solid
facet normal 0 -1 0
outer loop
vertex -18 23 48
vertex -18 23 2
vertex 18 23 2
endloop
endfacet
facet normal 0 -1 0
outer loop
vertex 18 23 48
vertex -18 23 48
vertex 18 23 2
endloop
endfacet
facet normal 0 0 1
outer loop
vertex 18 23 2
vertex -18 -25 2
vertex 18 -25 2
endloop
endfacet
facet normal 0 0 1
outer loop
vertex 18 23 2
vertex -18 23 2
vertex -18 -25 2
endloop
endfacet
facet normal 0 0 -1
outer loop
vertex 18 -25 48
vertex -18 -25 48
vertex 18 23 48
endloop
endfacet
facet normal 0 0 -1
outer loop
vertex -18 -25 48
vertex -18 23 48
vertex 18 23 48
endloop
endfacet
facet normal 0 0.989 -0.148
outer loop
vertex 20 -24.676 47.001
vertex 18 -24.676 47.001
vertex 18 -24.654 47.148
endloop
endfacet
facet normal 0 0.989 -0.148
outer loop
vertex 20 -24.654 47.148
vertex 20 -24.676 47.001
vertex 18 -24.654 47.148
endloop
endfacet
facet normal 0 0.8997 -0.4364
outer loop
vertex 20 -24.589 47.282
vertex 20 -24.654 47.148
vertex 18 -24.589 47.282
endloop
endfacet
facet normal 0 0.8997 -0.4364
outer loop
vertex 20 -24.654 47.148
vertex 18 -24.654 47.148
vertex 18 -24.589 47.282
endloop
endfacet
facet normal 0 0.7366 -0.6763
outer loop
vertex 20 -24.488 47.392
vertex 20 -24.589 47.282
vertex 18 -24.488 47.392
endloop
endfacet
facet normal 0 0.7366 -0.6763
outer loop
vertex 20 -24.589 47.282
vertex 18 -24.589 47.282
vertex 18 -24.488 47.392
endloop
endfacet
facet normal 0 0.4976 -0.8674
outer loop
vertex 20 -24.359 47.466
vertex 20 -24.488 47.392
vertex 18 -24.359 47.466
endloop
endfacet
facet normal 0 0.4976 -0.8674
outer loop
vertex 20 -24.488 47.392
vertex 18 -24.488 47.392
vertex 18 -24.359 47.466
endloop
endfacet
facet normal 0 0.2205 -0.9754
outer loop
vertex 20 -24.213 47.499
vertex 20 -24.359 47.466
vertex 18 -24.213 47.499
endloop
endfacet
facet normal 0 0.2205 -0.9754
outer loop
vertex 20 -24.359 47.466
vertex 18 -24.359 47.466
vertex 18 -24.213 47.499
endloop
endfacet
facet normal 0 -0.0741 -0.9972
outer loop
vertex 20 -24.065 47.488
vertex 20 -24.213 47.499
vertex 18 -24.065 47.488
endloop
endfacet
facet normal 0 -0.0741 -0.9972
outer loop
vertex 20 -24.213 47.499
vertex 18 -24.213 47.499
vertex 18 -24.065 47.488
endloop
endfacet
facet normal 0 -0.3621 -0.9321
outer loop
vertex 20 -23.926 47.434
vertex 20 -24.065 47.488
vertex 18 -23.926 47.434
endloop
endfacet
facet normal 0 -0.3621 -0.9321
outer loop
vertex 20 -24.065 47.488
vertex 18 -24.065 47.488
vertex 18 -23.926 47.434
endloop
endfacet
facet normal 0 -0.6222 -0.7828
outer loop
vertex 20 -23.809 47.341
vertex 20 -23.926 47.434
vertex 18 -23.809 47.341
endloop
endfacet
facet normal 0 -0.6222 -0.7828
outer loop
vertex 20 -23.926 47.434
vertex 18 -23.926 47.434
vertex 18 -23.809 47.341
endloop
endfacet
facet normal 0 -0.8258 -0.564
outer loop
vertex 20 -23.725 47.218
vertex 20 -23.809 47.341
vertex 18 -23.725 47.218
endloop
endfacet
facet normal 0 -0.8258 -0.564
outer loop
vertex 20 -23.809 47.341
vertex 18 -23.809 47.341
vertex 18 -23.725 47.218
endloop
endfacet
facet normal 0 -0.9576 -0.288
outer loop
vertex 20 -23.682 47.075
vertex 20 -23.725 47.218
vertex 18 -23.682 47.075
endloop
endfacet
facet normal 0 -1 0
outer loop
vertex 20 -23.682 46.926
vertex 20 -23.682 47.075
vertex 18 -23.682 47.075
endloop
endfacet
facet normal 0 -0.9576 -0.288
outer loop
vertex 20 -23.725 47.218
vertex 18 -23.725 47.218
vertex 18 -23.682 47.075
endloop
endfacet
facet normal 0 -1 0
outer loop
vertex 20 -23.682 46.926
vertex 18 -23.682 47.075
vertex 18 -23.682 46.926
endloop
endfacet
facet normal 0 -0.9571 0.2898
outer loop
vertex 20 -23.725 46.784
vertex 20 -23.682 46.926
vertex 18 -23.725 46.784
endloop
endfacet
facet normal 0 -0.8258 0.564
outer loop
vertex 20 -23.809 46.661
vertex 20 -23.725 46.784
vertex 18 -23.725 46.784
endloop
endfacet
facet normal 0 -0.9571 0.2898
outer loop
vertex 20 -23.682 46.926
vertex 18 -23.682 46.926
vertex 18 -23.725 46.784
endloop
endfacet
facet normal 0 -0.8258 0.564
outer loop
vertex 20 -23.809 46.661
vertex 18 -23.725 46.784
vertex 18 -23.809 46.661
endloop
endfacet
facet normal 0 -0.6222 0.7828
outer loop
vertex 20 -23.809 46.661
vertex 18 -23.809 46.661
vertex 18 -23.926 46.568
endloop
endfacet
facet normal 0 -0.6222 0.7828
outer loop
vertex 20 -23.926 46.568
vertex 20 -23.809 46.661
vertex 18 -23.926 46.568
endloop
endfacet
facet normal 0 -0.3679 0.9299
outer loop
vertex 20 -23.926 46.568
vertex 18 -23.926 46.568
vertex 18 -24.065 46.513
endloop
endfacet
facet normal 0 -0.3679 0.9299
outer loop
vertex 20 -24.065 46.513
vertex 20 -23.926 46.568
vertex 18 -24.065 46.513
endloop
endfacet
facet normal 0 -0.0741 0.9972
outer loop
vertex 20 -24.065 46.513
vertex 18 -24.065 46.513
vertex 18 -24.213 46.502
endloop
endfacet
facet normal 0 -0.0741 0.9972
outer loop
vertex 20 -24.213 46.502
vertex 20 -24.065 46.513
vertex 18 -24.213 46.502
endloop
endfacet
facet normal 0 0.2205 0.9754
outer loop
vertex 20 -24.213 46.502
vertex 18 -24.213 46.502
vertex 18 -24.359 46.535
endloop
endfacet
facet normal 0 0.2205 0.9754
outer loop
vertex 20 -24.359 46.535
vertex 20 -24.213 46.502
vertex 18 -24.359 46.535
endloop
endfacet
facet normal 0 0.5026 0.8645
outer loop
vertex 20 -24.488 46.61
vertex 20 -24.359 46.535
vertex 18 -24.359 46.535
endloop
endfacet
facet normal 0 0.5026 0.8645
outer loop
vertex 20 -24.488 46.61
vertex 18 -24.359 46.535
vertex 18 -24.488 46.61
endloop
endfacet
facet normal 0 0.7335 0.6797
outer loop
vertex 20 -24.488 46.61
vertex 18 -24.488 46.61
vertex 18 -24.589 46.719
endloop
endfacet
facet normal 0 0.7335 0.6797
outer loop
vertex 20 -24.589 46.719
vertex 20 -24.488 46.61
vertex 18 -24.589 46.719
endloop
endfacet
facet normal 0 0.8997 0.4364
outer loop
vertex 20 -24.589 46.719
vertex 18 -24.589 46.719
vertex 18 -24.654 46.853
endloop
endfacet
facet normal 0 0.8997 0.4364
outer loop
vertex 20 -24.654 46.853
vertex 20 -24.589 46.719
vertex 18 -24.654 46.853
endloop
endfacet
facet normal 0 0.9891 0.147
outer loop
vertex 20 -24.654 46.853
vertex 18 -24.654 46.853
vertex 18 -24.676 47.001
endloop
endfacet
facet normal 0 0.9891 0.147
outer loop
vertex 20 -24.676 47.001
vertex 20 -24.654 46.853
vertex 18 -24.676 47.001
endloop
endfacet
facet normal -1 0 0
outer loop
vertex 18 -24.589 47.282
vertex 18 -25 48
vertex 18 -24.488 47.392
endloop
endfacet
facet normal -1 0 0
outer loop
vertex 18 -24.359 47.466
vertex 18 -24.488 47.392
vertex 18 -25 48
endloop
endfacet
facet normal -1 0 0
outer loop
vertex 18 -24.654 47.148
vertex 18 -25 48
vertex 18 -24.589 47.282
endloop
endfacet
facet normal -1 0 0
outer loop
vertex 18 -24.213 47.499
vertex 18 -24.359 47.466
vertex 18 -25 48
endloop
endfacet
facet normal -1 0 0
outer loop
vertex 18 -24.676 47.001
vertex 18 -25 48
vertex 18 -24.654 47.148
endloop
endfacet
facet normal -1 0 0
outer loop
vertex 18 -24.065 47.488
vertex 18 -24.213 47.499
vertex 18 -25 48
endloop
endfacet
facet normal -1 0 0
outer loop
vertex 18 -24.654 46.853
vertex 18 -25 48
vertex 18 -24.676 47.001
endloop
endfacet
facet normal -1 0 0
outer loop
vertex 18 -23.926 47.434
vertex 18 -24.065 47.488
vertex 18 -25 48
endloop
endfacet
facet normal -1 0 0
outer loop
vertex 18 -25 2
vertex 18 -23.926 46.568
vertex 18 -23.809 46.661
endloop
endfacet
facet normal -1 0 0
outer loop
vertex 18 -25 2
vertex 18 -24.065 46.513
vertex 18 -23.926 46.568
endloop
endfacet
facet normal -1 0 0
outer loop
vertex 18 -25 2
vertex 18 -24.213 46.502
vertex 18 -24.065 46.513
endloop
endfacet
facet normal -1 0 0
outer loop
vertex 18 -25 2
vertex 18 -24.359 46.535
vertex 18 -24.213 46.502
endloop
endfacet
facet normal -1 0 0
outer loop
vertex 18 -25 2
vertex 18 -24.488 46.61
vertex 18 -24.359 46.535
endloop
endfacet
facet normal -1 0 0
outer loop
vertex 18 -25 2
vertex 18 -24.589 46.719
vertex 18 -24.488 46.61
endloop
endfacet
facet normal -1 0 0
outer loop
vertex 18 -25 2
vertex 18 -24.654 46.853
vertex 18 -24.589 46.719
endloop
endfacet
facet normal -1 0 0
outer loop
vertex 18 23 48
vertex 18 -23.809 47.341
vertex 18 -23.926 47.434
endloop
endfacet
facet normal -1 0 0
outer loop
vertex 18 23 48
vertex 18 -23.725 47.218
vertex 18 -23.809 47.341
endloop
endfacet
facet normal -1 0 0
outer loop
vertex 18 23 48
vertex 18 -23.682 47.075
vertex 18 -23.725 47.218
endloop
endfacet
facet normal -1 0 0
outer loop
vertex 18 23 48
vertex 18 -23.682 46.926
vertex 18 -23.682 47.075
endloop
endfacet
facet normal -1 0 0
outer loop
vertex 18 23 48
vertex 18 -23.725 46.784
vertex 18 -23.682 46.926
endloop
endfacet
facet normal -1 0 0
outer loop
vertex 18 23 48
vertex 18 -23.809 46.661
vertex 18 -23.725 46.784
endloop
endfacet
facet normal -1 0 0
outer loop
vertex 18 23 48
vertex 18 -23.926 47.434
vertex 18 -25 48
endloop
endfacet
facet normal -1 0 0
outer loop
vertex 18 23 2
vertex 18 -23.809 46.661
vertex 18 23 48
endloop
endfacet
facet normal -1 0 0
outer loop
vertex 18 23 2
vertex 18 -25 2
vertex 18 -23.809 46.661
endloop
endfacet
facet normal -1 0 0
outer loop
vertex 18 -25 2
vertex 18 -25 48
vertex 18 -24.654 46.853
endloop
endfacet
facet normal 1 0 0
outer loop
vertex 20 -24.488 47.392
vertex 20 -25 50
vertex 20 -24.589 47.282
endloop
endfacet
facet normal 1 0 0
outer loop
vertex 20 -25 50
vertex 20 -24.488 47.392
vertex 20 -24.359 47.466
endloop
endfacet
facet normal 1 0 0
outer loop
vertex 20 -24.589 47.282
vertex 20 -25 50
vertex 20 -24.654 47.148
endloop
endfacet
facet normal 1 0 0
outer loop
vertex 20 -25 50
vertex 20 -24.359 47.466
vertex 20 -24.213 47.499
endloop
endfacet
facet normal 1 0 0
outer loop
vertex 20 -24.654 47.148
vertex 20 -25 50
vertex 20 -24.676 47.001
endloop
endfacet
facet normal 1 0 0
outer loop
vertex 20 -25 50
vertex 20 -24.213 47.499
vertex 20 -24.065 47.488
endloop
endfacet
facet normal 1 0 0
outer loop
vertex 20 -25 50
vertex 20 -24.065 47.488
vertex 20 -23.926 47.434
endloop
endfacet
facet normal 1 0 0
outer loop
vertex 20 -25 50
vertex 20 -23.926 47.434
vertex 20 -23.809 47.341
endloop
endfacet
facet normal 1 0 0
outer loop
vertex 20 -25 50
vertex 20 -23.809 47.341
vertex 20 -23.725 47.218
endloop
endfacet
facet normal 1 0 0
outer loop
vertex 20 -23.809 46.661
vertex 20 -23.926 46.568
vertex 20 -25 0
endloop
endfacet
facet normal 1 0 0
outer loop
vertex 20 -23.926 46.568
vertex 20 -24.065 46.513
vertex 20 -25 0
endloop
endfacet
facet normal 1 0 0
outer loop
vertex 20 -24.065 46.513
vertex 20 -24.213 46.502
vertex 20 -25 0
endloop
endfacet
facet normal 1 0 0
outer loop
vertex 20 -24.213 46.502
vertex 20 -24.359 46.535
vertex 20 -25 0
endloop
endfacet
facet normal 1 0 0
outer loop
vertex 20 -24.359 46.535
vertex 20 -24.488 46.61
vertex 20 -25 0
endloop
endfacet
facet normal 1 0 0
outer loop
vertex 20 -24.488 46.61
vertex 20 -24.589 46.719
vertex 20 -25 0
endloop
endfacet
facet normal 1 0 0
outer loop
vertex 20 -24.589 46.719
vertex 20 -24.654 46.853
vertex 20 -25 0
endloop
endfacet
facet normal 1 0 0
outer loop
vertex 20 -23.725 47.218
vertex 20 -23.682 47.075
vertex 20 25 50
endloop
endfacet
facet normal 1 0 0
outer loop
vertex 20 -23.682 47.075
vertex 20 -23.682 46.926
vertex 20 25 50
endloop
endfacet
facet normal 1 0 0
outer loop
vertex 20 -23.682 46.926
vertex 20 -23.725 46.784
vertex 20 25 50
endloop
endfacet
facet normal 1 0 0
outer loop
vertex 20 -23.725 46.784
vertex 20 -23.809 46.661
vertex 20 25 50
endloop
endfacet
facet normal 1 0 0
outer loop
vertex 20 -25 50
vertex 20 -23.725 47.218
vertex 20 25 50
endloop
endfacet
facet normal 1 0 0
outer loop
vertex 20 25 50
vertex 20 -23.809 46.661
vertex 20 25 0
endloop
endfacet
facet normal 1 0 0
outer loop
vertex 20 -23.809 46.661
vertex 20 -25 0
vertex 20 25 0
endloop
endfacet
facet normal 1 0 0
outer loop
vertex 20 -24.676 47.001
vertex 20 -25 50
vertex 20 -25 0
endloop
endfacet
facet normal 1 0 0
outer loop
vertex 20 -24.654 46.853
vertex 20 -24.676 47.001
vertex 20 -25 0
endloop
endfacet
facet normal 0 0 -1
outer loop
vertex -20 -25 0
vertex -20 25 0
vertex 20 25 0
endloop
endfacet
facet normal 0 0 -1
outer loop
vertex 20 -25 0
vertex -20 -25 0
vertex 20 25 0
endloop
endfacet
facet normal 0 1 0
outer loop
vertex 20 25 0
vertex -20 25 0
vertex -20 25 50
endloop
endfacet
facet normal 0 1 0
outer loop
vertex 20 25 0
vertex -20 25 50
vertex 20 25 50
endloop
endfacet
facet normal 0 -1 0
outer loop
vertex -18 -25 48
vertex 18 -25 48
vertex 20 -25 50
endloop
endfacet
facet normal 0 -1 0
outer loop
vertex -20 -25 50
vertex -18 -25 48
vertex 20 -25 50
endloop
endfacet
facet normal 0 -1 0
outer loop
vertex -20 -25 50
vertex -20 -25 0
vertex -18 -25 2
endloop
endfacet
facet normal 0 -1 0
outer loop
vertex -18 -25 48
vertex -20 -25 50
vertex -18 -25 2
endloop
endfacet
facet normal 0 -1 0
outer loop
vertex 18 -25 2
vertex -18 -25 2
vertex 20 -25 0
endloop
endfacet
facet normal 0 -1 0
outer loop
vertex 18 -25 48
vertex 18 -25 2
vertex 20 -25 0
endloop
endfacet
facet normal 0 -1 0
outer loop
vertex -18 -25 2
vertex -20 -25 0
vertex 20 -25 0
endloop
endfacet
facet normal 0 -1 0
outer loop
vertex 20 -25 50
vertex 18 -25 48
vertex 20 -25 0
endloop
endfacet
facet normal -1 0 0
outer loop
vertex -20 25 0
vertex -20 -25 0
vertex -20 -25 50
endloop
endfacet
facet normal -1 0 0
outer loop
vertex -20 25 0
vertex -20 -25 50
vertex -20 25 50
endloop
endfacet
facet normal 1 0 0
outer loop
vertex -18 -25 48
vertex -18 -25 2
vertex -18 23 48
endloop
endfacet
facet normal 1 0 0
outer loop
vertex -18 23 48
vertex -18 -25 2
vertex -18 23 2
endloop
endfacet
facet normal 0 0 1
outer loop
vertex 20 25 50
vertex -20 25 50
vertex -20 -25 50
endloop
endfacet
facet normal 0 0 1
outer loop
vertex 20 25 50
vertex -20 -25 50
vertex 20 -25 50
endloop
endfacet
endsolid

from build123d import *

# Parameters (mm, degrees)
F0_W     = 40
F0_H     = 50
F1_DEPTH = 50
F2_T     = -2
F3_R     = 0.5
F4_DEPTH = 25


with BuildPart() as f1:
    # F0 (on Top) → F1 (new body)
    with BuildSketch(Plane.XY):
        Rectangle(F0_W, F0_H)
    extrude(amount=F1_DEPTH)

    # F2
    f2_openings = [f1.faces().sort_by_distance(p)[0] for p in [
        (0, -25, 25),
    ]]
    offset(amount=F2_T, openings=f2_openings)

    # F3 (on face) → F4 (cut)
    with BuildSketch(Plane(origin=(18, 0, 0), x_dir=(0, -1, 0), z_dir=(-1, 0, 0))):
        with Locations((24.175966, 47.000628)):
            Circle(F3_R)
    extrude(amount=-F4_DEPTH, mode=Mode.SUBTRACT)


solid = f1.part
